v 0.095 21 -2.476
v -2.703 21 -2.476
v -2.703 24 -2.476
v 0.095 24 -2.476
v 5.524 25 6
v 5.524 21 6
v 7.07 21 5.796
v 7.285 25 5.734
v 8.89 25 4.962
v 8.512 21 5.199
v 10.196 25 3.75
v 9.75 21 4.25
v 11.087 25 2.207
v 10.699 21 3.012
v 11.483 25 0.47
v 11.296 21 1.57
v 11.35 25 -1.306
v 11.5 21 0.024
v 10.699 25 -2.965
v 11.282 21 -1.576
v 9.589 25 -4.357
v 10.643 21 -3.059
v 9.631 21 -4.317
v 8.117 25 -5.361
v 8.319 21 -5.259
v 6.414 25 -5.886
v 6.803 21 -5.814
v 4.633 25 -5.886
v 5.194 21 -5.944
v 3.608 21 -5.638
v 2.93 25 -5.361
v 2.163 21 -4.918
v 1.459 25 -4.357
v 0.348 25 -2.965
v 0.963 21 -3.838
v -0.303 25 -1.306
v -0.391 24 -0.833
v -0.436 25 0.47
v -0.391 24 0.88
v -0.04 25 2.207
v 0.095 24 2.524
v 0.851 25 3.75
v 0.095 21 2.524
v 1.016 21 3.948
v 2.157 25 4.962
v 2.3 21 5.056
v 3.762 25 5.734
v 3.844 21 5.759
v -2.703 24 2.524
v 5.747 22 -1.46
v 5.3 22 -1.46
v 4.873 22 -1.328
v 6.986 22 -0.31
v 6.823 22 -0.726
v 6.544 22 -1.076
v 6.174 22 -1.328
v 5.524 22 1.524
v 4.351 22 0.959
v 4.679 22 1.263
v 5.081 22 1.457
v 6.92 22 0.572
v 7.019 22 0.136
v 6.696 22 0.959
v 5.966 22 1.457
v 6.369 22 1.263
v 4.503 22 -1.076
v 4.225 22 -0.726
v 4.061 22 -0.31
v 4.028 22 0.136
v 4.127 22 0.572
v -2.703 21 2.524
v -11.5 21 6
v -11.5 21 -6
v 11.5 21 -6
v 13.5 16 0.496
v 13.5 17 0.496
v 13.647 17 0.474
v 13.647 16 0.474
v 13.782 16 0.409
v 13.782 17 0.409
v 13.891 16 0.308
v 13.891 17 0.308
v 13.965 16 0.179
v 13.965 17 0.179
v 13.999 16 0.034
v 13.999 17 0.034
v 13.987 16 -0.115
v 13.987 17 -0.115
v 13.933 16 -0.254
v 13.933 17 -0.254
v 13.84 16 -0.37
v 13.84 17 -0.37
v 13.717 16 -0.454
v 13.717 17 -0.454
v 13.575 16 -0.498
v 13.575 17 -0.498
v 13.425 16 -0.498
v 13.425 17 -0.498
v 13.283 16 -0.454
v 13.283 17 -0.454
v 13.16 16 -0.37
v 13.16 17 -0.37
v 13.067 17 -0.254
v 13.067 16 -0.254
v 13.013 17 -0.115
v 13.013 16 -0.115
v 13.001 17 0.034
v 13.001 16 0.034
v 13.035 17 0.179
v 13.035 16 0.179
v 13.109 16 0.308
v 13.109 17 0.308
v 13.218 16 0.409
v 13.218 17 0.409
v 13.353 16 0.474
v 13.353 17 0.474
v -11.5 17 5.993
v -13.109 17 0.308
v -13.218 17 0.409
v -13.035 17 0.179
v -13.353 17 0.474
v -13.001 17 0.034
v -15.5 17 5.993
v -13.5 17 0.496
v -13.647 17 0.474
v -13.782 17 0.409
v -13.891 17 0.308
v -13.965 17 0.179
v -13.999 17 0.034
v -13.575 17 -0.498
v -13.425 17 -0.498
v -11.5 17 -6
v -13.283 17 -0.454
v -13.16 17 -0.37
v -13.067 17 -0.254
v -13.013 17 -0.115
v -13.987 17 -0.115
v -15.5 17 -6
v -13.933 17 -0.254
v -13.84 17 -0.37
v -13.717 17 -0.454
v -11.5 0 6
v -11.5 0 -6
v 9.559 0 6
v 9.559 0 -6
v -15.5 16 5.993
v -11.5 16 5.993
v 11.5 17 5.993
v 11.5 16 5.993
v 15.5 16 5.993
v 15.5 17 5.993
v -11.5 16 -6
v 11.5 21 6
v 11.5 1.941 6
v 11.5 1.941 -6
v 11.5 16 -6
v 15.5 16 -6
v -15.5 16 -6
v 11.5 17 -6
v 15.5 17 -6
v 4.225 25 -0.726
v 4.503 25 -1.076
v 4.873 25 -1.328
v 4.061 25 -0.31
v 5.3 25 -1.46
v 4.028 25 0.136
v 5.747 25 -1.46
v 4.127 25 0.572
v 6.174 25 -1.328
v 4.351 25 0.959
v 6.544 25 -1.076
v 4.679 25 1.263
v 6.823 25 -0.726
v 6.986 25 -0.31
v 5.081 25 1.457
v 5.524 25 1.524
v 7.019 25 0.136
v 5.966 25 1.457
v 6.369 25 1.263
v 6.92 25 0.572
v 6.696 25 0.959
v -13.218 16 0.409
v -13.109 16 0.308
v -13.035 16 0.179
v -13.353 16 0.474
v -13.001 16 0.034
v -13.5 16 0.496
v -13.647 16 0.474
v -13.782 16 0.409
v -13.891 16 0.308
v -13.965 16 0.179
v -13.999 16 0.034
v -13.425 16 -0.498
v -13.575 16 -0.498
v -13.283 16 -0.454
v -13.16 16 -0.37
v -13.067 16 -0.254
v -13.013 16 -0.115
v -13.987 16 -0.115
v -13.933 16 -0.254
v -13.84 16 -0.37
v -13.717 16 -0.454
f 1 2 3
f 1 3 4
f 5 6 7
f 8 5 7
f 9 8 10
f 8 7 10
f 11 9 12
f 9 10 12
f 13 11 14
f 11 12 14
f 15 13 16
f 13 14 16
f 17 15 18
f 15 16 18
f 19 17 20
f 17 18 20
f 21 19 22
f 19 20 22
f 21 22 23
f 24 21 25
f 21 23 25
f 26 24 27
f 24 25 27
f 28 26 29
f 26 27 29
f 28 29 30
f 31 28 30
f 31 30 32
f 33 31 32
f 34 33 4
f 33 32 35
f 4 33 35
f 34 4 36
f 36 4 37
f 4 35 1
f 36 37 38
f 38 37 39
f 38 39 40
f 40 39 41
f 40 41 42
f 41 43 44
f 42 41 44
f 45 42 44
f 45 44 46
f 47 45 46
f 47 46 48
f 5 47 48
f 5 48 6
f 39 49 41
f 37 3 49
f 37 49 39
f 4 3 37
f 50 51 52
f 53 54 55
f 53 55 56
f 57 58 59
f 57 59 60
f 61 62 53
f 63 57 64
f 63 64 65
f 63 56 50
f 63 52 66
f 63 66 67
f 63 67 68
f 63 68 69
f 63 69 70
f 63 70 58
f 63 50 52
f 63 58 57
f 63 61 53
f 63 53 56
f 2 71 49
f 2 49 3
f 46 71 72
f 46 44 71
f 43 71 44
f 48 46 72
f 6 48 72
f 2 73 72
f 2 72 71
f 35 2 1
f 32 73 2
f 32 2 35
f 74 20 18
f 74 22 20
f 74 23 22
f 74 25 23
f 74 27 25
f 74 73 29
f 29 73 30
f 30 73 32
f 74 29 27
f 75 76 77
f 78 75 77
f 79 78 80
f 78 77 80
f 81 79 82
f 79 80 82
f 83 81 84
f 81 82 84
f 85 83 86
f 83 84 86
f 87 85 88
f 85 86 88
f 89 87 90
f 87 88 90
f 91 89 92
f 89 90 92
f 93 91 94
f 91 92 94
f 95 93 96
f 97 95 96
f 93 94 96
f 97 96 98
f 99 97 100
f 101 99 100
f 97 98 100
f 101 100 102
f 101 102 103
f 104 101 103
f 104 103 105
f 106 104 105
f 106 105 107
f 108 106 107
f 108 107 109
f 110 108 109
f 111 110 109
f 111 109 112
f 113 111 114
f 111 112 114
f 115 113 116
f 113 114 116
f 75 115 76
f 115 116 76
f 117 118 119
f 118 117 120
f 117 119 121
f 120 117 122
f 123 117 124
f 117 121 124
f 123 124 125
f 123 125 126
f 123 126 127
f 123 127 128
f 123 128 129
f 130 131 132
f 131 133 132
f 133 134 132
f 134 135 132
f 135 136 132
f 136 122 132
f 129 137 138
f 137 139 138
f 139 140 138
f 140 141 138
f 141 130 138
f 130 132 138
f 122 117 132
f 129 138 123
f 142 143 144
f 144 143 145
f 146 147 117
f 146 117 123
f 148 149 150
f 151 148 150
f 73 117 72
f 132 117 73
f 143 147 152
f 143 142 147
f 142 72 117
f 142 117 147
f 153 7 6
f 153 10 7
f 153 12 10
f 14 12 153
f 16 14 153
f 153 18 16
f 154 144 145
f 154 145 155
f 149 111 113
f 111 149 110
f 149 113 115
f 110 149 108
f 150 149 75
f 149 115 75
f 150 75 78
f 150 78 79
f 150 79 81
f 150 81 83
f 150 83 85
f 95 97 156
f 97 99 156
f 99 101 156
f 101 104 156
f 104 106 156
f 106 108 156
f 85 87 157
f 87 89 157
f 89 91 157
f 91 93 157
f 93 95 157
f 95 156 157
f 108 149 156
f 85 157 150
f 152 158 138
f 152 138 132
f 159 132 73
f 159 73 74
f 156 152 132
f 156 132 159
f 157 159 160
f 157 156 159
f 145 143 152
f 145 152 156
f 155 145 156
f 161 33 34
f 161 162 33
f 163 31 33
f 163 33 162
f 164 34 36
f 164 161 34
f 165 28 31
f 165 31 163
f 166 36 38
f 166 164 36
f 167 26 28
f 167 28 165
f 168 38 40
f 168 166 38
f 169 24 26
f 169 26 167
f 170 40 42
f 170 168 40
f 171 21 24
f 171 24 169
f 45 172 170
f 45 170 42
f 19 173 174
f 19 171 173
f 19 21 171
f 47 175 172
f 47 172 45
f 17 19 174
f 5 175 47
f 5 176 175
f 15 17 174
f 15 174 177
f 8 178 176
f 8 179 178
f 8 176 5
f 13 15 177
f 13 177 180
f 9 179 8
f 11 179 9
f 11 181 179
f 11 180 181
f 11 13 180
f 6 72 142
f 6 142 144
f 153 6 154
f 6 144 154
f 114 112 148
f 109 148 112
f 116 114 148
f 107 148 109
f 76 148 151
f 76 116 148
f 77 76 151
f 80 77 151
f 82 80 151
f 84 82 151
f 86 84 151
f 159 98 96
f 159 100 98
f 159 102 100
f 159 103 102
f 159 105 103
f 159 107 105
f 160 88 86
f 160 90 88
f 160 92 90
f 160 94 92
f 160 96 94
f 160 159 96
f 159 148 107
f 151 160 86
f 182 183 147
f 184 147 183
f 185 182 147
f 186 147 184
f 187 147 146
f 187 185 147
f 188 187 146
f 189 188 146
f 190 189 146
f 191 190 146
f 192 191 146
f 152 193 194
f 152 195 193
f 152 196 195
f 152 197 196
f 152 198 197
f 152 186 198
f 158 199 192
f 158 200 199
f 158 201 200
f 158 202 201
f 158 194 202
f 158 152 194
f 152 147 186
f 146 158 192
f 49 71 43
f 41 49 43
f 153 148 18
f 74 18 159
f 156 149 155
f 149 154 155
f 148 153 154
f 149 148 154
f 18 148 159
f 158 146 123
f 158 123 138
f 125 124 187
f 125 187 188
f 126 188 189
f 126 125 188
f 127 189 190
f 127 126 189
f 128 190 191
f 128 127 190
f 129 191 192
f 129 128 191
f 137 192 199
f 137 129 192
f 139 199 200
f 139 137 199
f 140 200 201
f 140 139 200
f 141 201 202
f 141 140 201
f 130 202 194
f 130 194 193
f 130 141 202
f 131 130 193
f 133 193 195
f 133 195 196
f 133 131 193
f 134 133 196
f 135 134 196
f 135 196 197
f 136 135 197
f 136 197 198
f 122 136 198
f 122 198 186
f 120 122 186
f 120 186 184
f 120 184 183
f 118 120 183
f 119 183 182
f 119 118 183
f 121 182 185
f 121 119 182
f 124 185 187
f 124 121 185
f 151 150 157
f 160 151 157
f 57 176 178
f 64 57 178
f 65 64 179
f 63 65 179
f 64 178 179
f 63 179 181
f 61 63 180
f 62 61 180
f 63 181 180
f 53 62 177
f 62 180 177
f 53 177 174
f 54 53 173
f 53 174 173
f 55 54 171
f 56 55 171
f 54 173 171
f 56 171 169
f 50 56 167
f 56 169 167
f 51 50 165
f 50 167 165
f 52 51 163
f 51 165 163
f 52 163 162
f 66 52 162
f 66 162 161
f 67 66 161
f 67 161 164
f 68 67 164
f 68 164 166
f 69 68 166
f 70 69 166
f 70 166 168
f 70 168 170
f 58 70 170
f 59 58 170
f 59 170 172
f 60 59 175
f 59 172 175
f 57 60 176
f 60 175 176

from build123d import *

# Parameters (mm, degrees)
ESQUISSE1_W             = 23
ESQUISSE1_H             = 12
BOSS_EXTRU_1_DEPTH      = 21
ESQUISSE2_W             = 4
ESQUISSE2_H             = 11.992585314
BOSS_EXTRU_2_DEPTH      = 1
ESQUISSE3_R             = 0.5
ENL_V_MAT_EXTRU_1_DEPTH = 1
ESQUISSE4_R             = 5.976429807
BOSS_EXTRU_3_DEPTH      = 4
ESQUISSE5_W             = 4.5
ESQUISSE5_H             = 5
BOSS_EXTRU_4_DEPTH      = 3
ENL_V_MAT_EXTRU_3_DEPTH = 32.768695283
ESQUISSE7_R             = 1.5
ENL_V_MAT_EXTRU_4_DEPTH = 3


with BuildPart() as part:
    # Esquisse1 → Boss.-Extru.1 (new body)
    with BuildSketch(Plane(origin=(0, 0, 0), x_dir=(1, 0, 0), z_dir=(0, 1, 0))):
        Rectangle(ESQUISSE1_W, ESQUISSE1_H)
    extrude(amount=BOSS_EXTRU_1_DEPTH)

    # Esquisse2 → Boss.-Extru.2 (add)
    with BuildSketch(Plane(origin=(0, 16, 0), x_dir=(1, 0, 0), z_dir=(0, 1, 0))):
        with Locations((13.5, 0.003707343)):
            Rectangle(ESQUISSE2_W, ESQUISSE2_H)
    boss_extru_2 = extrude(amount=BOSS_EXTRU_2_DEPTH)

    # Esquisse3 → Enlèv. mat.-Extru.1 (cut)
    with BuildSketch(Plane(origin=(0, 17, 0), x_dir=(1, 0, 0), z_dir=(0, 1, 0))):
        with Locations(Location((13.5, 0.003707343, 0), (0, 0, 270))):
            Circle(ESQUISSE3_R)
    enl_v_mat_extru_1 = extrude(amount=-ENL_V_MAT_EXTRU_1_DEPTH, mode=Mode.SUBTRACT)

    # Symétrie1: Boss.-Extru.2 across plane
    add(boss_extru_2.mirror(Plane(origin=(0, 0, 0), x_dir=(0, 0, 1), z_dir=(1, 0, 0))))

    # Symétrie2: Enlèv. mat.-Extru.1 across plane
    add(enl_v_mat_extru_1.mirror(Plane(origin=(0, 0, 0), x_dir=(0, 0, 1), z_dir=(1, 0, 0))), mode=Mode.SUBTRACT)

    # Esquisse4 → Boss.-Extru.3 (add)
    with BuildSketch(Plane(origin=(0, 21, 0), x_dir=(1, 0, 0), z_dir=(0, 1, 0))):
        with Locations(Location((5.523570193, -0.023570193, 0), (0, 0, 270))):
            Circle(ESQUISSE4_R)
    extrude(amount=BOSS_EXTRU_3_DEPTH)

    # Esquisse5 → Boss.-Extru.4 (add)
    with BuildSketch(Plane(origin=(0, 21, 0), x_dir=(1, 0, 0), z_dir=(0, 1, 0))):
        with Locations((-0.452859613, -0.023570193)):
            Rectangle(ESQUISSE5_W, ESQUISSE5_H)
    extrude(amount=BOSS_EXTRU_4_DEPTH)

    # Esquisse6 → Enlèv. mat.-Extru.3 (cut, through all)
    with BuildSketch(Plane.XY.offset(6)):
        Polygon((9.55941942, 0), (11.5, 1.94058058), (11.5, 0), align=None)
    extrude(amount=-ENL_V_MAT_EXTRU_3_DEPTH, mode=Mode.SUBTRACT)

    # Esquisse7 → Enlèv. mat.-Extru.4 (cut)
    with BuildSketch(Plane(origin=(0, 25, 0), x_dir=(1, 0, 0), z_dir=(0, 1, 0))):
        with Locations(Location((5.523570193, -0.023570193, 0), (0, 0, 270))):
            Circle(ESQUISSE7_R)
    extrude(amount=-ENL_V_MAT_EXTRU_4_DEPTH, mode=Mode.SUBTRACT)


solid = part.part
